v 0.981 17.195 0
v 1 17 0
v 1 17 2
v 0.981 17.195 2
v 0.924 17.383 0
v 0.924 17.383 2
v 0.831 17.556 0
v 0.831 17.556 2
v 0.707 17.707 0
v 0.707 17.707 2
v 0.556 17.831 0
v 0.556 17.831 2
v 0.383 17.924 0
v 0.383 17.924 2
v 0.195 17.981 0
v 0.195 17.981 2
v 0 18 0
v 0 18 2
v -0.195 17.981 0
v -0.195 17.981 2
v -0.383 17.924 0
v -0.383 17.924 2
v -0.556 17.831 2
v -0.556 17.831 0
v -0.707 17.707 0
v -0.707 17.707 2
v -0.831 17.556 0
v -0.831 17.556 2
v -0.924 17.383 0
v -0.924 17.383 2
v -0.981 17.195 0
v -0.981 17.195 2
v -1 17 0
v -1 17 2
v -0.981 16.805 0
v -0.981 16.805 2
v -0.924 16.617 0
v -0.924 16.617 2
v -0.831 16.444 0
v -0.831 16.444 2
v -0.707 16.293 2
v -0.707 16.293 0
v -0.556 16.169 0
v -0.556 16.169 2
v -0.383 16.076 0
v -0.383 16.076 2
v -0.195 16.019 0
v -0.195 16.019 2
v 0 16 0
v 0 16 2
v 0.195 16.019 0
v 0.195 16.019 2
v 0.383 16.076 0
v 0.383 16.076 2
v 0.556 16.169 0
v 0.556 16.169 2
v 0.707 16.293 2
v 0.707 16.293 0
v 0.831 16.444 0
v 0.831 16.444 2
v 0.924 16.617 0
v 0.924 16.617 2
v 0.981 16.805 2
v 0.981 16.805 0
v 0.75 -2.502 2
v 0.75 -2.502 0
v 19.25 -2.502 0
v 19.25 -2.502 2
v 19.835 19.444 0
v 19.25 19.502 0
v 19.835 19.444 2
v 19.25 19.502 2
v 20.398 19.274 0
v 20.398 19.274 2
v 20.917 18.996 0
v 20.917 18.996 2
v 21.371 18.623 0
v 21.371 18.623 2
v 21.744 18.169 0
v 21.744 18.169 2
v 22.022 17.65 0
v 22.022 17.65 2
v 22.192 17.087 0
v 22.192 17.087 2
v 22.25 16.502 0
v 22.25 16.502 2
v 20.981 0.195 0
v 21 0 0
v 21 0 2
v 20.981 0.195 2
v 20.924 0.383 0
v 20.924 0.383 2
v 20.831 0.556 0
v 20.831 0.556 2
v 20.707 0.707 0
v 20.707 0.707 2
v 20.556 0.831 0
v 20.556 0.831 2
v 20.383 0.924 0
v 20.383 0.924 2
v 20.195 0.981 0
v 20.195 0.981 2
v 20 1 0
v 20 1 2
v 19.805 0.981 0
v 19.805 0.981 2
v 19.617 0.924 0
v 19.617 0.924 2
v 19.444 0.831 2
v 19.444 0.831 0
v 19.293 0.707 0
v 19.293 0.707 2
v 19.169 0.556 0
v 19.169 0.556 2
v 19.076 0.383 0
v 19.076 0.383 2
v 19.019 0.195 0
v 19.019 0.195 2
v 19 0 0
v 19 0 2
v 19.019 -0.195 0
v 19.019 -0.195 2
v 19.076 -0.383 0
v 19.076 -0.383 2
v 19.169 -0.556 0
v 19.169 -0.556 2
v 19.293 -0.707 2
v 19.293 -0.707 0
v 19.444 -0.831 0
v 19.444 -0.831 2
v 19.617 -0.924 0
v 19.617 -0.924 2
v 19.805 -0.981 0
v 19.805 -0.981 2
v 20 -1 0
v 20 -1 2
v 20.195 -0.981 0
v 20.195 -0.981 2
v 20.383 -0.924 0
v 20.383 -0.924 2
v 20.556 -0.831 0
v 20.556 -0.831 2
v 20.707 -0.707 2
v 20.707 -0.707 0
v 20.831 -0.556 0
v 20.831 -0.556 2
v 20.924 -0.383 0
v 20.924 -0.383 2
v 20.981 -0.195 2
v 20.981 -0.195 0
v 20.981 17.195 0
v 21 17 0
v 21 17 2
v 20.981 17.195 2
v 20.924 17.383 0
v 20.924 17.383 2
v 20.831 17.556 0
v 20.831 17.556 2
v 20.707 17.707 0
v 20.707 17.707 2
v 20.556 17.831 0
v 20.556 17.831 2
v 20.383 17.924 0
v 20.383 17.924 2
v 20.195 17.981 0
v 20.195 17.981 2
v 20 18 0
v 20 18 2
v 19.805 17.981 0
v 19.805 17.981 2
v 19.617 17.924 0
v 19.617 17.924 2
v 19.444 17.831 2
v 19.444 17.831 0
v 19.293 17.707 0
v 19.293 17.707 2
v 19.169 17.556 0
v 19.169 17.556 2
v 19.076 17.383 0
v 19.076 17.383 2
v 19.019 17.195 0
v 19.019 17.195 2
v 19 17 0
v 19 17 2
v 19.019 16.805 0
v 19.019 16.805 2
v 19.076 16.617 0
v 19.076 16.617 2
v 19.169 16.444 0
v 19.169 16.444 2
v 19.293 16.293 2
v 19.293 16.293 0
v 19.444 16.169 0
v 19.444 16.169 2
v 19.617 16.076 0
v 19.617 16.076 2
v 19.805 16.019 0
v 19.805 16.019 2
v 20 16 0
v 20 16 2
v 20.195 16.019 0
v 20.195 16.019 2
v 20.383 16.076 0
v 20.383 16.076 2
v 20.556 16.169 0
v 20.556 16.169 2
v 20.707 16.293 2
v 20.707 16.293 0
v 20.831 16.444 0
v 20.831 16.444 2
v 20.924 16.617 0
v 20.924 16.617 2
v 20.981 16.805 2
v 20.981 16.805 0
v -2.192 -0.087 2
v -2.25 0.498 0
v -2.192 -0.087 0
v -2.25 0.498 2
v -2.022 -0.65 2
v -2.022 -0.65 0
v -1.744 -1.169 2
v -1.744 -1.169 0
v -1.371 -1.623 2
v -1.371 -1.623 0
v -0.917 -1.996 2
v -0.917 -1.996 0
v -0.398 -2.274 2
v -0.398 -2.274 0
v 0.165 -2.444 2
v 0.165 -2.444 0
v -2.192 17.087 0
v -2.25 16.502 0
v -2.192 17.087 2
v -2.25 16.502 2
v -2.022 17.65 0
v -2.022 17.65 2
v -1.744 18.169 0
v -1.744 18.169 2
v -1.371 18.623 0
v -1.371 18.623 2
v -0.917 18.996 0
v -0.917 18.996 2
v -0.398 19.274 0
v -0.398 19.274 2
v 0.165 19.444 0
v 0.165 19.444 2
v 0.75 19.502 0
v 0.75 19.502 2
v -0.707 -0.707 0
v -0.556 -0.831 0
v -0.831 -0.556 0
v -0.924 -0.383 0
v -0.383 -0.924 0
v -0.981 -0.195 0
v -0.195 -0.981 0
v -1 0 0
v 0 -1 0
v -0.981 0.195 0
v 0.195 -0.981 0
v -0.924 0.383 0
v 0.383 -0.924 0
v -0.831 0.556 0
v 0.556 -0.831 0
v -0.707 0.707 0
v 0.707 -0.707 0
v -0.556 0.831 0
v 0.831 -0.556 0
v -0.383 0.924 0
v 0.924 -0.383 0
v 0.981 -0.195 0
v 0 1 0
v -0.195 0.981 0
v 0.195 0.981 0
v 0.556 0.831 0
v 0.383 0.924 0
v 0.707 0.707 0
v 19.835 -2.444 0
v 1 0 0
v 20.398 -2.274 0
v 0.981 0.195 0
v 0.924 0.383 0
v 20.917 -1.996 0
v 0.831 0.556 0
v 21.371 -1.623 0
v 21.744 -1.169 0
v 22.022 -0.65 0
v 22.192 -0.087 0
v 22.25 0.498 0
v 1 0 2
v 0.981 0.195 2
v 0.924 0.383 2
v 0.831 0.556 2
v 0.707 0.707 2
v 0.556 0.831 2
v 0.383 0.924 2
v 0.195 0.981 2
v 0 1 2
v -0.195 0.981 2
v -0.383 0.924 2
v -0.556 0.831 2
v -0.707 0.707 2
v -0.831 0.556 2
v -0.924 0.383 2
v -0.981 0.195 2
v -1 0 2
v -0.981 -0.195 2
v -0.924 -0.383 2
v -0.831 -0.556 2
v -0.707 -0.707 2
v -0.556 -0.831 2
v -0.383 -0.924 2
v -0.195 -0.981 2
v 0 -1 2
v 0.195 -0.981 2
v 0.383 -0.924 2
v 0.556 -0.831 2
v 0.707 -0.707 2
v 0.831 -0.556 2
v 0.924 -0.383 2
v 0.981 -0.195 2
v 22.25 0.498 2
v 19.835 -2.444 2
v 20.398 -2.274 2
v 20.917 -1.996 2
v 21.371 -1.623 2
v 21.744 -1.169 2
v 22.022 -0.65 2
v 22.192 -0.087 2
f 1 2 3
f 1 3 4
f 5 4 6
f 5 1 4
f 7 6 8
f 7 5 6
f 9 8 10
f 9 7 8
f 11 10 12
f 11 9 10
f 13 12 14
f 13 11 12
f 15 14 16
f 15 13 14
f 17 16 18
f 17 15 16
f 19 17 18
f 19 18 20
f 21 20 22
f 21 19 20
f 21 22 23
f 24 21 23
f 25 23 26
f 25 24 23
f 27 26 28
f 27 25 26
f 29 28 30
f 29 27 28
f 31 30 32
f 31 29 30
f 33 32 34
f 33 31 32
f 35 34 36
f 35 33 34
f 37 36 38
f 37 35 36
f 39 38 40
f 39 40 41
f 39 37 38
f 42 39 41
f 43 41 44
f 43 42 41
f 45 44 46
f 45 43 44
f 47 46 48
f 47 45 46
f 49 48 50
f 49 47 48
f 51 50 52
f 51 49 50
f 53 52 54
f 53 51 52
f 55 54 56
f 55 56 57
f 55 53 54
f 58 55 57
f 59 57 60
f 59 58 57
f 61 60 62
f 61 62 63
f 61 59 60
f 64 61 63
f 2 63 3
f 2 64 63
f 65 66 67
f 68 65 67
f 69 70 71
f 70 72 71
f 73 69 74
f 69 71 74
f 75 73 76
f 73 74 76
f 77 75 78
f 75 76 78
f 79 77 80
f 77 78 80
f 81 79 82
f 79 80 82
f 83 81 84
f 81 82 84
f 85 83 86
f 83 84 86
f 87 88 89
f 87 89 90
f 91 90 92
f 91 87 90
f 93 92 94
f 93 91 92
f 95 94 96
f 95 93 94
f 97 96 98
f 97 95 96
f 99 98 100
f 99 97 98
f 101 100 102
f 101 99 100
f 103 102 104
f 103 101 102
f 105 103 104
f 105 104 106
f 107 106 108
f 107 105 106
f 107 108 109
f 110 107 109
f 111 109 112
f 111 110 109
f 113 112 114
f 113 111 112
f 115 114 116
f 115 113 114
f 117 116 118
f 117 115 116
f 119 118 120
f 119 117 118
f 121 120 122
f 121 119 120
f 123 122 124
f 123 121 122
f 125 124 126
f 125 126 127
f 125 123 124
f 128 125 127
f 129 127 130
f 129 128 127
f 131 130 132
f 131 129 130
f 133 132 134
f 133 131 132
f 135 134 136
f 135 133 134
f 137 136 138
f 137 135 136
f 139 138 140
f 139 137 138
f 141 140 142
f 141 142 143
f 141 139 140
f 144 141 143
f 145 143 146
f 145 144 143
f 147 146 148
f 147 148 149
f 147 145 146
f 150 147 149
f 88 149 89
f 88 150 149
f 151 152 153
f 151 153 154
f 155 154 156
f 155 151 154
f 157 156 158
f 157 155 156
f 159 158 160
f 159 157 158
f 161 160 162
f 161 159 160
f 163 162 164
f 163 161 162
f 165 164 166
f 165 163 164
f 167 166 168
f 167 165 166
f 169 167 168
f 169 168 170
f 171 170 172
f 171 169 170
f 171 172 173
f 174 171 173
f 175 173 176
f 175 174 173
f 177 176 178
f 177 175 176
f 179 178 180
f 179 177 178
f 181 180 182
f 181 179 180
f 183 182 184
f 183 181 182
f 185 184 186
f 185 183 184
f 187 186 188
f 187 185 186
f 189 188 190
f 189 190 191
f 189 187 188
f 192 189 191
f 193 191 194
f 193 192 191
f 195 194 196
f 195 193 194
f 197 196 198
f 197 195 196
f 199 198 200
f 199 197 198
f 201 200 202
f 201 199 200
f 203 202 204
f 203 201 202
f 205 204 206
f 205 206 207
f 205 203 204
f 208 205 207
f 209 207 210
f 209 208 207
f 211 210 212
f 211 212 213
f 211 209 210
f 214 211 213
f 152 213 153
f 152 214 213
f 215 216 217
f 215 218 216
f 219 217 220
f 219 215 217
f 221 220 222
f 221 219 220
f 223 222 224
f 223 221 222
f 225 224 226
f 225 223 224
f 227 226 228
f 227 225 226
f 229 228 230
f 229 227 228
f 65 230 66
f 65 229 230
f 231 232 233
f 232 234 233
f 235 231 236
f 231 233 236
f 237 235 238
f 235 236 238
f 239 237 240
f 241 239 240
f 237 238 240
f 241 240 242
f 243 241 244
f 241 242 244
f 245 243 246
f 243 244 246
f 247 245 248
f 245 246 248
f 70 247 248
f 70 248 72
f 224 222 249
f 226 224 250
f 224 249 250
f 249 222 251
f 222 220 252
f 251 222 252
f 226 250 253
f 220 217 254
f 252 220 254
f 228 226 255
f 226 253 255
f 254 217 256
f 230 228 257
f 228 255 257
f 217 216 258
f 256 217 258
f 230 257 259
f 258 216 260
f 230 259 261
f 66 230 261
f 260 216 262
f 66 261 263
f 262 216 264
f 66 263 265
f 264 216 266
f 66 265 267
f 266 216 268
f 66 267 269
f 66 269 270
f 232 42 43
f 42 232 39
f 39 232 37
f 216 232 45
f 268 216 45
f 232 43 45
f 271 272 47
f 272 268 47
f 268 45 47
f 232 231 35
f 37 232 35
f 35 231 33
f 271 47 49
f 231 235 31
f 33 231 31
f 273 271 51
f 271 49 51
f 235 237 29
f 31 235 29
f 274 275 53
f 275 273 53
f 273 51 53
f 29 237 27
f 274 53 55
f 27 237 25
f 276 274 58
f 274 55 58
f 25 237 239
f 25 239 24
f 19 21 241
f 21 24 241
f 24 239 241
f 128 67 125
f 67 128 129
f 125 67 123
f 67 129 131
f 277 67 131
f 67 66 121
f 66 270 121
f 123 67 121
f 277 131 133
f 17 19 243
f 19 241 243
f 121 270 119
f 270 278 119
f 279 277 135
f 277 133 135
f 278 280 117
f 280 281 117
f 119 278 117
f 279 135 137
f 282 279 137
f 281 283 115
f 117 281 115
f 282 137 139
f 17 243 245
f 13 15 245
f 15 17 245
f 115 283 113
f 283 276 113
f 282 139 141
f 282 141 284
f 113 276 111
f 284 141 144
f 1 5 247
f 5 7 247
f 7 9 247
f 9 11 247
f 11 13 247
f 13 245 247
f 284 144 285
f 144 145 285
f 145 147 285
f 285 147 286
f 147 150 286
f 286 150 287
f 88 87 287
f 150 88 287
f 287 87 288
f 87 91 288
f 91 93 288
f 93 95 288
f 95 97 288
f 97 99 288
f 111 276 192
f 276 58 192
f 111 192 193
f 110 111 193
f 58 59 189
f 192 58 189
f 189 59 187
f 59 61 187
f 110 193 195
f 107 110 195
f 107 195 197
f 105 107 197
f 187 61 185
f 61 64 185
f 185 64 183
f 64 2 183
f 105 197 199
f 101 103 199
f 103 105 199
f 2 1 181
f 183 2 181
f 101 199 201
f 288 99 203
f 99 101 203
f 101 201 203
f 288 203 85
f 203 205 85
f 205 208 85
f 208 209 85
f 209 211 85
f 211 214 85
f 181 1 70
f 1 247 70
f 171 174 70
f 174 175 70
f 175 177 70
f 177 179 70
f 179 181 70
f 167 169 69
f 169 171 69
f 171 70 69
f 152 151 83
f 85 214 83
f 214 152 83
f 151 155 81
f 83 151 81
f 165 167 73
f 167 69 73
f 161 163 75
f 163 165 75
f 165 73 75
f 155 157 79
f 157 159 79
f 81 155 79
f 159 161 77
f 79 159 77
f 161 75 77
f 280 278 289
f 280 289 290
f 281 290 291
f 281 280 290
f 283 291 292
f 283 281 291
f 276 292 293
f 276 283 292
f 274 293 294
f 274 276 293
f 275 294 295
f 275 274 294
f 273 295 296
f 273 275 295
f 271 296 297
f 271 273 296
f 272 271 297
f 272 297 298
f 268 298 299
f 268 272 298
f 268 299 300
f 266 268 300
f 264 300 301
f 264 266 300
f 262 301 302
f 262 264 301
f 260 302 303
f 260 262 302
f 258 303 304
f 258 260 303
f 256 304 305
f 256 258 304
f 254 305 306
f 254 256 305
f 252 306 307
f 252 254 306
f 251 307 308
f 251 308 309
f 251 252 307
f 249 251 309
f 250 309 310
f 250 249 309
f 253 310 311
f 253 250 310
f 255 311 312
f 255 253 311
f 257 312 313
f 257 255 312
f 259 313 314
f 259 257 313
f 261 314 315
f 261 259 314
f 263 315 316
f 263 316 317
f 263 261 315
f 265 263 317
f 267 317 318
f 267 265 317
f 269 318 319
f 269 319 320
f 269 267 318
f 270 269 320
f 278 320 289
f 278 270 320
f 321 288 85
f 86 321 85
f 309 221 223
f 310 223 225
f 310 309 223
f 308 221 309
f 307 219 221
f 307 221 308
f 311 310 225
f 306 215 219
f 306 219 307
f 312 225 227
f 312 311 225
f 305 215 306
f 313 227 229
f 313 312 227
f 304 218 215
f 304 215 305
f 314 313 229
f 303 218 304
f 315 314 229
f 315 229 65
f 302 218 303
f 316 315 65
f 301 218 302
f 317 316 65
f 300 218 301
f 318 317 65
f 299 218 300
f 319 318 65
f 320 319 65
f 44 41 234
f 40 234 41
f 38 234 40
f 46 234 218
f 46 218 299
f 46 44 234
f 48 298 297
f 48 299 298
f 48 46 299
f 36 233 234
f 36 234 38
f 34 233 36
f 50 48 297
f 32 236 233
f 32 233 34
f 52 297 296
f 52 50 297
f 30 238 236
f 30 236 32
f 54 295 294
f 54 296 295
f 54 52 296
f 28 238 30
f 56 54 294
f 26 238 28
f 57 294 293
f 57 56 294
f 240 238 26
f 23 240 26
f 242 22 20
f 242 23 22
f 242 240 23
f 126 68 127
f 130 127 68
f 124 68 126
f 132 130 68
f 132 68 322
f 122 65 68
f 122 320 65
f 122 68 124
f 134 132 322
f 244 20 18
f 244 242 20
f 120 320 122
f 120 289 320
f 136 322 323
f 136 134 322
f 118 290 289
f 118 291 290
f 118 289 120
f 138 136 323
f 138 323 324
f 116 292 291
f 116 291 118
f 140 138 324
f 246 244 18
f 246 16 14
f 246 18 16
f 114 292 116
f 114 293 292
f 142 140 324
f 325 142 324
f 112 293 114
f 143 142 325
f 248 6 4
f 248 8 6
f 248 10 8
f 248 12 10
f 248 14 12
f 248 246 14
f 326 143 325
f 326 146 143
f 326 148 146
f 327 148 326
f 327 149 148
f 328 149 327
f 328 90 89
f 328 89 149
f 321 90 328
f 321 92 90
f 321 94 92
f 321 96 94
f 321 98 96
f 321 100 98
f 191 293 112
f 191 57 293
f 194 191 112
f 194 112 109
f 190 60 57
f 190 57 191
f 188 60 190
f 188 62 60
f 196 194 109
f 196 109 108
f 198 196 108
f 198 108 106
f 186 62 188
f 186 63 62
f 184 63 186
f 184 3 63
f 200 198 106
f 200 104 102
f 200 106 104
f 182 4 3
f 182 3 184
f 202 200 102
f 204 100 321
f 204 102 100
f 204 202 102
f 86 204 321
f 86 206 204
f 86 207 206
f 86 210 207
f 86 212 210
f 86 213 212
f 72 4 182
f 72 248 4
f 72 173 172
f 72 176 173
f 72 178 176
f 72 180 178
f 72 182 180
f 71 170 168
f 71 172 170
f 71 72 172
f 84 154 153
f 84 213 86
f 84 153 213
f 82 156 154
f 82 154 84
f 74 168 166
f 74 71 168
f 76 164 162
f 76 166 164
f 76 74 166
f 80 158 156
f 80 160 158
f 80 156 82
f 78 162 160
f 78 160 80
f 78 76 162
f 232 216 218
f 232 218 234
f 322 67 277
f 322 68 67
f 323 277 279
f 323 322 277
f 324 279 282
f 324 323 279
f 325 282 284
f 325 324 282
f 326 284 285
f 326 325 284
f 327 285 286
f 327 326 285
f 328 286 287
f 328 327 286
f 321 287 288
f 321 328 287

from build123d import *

# Parameters (mm, degrees)
SCHIZZO1_W                   = 24.5
SCHIZZO1_H                   = 22.0038
SCHIZZO1_R                   = 1
ESTRUSIONE_ESTRUSIONE1_DEPTH = 2
RACCORDO1_R                  = 3


with BuildPart() as part:
    # Schizzo1 → Estrusione-Estrusione1 (new body)
    with BuildSketch(Plane.XY):
        with Locations((10, 8.5)):
            Rectangle(SCHIZZO1_W, SCHIZZO1_H)
        Circle(SCHIZZO1_R, mode=Mode.SUBTRACT)
        with Locations((20, 0)):
            Circle(SCHIZZO1_R, mode=Mode.SUBTRACT)
        with Locations((20, 17)):
            Circle(SCHIZZO1_R, mode=Mode.SUBTRACT)
        with Locations((0, 17)):
            Circle(SCHIZZO1_R, mode=Mode.SUBTRACT)
    extrude(amount=ESTRUSIONE_ESTRUSIONE1_DEPTH)

    # Raccordo1
    raccordo1_edges = [part.edges().sort_by_distance(p)[0] for p in [
        (22.25, -2.5019, 1),
        (-2.25, -2.5019, 1),
        (-2.25, 19.5019, 1),
        (22.25, 19.5019, 1),
    ]]
    fillet(raccordo1_edges, radius=RACCORDO1_R)


solid = part.part
